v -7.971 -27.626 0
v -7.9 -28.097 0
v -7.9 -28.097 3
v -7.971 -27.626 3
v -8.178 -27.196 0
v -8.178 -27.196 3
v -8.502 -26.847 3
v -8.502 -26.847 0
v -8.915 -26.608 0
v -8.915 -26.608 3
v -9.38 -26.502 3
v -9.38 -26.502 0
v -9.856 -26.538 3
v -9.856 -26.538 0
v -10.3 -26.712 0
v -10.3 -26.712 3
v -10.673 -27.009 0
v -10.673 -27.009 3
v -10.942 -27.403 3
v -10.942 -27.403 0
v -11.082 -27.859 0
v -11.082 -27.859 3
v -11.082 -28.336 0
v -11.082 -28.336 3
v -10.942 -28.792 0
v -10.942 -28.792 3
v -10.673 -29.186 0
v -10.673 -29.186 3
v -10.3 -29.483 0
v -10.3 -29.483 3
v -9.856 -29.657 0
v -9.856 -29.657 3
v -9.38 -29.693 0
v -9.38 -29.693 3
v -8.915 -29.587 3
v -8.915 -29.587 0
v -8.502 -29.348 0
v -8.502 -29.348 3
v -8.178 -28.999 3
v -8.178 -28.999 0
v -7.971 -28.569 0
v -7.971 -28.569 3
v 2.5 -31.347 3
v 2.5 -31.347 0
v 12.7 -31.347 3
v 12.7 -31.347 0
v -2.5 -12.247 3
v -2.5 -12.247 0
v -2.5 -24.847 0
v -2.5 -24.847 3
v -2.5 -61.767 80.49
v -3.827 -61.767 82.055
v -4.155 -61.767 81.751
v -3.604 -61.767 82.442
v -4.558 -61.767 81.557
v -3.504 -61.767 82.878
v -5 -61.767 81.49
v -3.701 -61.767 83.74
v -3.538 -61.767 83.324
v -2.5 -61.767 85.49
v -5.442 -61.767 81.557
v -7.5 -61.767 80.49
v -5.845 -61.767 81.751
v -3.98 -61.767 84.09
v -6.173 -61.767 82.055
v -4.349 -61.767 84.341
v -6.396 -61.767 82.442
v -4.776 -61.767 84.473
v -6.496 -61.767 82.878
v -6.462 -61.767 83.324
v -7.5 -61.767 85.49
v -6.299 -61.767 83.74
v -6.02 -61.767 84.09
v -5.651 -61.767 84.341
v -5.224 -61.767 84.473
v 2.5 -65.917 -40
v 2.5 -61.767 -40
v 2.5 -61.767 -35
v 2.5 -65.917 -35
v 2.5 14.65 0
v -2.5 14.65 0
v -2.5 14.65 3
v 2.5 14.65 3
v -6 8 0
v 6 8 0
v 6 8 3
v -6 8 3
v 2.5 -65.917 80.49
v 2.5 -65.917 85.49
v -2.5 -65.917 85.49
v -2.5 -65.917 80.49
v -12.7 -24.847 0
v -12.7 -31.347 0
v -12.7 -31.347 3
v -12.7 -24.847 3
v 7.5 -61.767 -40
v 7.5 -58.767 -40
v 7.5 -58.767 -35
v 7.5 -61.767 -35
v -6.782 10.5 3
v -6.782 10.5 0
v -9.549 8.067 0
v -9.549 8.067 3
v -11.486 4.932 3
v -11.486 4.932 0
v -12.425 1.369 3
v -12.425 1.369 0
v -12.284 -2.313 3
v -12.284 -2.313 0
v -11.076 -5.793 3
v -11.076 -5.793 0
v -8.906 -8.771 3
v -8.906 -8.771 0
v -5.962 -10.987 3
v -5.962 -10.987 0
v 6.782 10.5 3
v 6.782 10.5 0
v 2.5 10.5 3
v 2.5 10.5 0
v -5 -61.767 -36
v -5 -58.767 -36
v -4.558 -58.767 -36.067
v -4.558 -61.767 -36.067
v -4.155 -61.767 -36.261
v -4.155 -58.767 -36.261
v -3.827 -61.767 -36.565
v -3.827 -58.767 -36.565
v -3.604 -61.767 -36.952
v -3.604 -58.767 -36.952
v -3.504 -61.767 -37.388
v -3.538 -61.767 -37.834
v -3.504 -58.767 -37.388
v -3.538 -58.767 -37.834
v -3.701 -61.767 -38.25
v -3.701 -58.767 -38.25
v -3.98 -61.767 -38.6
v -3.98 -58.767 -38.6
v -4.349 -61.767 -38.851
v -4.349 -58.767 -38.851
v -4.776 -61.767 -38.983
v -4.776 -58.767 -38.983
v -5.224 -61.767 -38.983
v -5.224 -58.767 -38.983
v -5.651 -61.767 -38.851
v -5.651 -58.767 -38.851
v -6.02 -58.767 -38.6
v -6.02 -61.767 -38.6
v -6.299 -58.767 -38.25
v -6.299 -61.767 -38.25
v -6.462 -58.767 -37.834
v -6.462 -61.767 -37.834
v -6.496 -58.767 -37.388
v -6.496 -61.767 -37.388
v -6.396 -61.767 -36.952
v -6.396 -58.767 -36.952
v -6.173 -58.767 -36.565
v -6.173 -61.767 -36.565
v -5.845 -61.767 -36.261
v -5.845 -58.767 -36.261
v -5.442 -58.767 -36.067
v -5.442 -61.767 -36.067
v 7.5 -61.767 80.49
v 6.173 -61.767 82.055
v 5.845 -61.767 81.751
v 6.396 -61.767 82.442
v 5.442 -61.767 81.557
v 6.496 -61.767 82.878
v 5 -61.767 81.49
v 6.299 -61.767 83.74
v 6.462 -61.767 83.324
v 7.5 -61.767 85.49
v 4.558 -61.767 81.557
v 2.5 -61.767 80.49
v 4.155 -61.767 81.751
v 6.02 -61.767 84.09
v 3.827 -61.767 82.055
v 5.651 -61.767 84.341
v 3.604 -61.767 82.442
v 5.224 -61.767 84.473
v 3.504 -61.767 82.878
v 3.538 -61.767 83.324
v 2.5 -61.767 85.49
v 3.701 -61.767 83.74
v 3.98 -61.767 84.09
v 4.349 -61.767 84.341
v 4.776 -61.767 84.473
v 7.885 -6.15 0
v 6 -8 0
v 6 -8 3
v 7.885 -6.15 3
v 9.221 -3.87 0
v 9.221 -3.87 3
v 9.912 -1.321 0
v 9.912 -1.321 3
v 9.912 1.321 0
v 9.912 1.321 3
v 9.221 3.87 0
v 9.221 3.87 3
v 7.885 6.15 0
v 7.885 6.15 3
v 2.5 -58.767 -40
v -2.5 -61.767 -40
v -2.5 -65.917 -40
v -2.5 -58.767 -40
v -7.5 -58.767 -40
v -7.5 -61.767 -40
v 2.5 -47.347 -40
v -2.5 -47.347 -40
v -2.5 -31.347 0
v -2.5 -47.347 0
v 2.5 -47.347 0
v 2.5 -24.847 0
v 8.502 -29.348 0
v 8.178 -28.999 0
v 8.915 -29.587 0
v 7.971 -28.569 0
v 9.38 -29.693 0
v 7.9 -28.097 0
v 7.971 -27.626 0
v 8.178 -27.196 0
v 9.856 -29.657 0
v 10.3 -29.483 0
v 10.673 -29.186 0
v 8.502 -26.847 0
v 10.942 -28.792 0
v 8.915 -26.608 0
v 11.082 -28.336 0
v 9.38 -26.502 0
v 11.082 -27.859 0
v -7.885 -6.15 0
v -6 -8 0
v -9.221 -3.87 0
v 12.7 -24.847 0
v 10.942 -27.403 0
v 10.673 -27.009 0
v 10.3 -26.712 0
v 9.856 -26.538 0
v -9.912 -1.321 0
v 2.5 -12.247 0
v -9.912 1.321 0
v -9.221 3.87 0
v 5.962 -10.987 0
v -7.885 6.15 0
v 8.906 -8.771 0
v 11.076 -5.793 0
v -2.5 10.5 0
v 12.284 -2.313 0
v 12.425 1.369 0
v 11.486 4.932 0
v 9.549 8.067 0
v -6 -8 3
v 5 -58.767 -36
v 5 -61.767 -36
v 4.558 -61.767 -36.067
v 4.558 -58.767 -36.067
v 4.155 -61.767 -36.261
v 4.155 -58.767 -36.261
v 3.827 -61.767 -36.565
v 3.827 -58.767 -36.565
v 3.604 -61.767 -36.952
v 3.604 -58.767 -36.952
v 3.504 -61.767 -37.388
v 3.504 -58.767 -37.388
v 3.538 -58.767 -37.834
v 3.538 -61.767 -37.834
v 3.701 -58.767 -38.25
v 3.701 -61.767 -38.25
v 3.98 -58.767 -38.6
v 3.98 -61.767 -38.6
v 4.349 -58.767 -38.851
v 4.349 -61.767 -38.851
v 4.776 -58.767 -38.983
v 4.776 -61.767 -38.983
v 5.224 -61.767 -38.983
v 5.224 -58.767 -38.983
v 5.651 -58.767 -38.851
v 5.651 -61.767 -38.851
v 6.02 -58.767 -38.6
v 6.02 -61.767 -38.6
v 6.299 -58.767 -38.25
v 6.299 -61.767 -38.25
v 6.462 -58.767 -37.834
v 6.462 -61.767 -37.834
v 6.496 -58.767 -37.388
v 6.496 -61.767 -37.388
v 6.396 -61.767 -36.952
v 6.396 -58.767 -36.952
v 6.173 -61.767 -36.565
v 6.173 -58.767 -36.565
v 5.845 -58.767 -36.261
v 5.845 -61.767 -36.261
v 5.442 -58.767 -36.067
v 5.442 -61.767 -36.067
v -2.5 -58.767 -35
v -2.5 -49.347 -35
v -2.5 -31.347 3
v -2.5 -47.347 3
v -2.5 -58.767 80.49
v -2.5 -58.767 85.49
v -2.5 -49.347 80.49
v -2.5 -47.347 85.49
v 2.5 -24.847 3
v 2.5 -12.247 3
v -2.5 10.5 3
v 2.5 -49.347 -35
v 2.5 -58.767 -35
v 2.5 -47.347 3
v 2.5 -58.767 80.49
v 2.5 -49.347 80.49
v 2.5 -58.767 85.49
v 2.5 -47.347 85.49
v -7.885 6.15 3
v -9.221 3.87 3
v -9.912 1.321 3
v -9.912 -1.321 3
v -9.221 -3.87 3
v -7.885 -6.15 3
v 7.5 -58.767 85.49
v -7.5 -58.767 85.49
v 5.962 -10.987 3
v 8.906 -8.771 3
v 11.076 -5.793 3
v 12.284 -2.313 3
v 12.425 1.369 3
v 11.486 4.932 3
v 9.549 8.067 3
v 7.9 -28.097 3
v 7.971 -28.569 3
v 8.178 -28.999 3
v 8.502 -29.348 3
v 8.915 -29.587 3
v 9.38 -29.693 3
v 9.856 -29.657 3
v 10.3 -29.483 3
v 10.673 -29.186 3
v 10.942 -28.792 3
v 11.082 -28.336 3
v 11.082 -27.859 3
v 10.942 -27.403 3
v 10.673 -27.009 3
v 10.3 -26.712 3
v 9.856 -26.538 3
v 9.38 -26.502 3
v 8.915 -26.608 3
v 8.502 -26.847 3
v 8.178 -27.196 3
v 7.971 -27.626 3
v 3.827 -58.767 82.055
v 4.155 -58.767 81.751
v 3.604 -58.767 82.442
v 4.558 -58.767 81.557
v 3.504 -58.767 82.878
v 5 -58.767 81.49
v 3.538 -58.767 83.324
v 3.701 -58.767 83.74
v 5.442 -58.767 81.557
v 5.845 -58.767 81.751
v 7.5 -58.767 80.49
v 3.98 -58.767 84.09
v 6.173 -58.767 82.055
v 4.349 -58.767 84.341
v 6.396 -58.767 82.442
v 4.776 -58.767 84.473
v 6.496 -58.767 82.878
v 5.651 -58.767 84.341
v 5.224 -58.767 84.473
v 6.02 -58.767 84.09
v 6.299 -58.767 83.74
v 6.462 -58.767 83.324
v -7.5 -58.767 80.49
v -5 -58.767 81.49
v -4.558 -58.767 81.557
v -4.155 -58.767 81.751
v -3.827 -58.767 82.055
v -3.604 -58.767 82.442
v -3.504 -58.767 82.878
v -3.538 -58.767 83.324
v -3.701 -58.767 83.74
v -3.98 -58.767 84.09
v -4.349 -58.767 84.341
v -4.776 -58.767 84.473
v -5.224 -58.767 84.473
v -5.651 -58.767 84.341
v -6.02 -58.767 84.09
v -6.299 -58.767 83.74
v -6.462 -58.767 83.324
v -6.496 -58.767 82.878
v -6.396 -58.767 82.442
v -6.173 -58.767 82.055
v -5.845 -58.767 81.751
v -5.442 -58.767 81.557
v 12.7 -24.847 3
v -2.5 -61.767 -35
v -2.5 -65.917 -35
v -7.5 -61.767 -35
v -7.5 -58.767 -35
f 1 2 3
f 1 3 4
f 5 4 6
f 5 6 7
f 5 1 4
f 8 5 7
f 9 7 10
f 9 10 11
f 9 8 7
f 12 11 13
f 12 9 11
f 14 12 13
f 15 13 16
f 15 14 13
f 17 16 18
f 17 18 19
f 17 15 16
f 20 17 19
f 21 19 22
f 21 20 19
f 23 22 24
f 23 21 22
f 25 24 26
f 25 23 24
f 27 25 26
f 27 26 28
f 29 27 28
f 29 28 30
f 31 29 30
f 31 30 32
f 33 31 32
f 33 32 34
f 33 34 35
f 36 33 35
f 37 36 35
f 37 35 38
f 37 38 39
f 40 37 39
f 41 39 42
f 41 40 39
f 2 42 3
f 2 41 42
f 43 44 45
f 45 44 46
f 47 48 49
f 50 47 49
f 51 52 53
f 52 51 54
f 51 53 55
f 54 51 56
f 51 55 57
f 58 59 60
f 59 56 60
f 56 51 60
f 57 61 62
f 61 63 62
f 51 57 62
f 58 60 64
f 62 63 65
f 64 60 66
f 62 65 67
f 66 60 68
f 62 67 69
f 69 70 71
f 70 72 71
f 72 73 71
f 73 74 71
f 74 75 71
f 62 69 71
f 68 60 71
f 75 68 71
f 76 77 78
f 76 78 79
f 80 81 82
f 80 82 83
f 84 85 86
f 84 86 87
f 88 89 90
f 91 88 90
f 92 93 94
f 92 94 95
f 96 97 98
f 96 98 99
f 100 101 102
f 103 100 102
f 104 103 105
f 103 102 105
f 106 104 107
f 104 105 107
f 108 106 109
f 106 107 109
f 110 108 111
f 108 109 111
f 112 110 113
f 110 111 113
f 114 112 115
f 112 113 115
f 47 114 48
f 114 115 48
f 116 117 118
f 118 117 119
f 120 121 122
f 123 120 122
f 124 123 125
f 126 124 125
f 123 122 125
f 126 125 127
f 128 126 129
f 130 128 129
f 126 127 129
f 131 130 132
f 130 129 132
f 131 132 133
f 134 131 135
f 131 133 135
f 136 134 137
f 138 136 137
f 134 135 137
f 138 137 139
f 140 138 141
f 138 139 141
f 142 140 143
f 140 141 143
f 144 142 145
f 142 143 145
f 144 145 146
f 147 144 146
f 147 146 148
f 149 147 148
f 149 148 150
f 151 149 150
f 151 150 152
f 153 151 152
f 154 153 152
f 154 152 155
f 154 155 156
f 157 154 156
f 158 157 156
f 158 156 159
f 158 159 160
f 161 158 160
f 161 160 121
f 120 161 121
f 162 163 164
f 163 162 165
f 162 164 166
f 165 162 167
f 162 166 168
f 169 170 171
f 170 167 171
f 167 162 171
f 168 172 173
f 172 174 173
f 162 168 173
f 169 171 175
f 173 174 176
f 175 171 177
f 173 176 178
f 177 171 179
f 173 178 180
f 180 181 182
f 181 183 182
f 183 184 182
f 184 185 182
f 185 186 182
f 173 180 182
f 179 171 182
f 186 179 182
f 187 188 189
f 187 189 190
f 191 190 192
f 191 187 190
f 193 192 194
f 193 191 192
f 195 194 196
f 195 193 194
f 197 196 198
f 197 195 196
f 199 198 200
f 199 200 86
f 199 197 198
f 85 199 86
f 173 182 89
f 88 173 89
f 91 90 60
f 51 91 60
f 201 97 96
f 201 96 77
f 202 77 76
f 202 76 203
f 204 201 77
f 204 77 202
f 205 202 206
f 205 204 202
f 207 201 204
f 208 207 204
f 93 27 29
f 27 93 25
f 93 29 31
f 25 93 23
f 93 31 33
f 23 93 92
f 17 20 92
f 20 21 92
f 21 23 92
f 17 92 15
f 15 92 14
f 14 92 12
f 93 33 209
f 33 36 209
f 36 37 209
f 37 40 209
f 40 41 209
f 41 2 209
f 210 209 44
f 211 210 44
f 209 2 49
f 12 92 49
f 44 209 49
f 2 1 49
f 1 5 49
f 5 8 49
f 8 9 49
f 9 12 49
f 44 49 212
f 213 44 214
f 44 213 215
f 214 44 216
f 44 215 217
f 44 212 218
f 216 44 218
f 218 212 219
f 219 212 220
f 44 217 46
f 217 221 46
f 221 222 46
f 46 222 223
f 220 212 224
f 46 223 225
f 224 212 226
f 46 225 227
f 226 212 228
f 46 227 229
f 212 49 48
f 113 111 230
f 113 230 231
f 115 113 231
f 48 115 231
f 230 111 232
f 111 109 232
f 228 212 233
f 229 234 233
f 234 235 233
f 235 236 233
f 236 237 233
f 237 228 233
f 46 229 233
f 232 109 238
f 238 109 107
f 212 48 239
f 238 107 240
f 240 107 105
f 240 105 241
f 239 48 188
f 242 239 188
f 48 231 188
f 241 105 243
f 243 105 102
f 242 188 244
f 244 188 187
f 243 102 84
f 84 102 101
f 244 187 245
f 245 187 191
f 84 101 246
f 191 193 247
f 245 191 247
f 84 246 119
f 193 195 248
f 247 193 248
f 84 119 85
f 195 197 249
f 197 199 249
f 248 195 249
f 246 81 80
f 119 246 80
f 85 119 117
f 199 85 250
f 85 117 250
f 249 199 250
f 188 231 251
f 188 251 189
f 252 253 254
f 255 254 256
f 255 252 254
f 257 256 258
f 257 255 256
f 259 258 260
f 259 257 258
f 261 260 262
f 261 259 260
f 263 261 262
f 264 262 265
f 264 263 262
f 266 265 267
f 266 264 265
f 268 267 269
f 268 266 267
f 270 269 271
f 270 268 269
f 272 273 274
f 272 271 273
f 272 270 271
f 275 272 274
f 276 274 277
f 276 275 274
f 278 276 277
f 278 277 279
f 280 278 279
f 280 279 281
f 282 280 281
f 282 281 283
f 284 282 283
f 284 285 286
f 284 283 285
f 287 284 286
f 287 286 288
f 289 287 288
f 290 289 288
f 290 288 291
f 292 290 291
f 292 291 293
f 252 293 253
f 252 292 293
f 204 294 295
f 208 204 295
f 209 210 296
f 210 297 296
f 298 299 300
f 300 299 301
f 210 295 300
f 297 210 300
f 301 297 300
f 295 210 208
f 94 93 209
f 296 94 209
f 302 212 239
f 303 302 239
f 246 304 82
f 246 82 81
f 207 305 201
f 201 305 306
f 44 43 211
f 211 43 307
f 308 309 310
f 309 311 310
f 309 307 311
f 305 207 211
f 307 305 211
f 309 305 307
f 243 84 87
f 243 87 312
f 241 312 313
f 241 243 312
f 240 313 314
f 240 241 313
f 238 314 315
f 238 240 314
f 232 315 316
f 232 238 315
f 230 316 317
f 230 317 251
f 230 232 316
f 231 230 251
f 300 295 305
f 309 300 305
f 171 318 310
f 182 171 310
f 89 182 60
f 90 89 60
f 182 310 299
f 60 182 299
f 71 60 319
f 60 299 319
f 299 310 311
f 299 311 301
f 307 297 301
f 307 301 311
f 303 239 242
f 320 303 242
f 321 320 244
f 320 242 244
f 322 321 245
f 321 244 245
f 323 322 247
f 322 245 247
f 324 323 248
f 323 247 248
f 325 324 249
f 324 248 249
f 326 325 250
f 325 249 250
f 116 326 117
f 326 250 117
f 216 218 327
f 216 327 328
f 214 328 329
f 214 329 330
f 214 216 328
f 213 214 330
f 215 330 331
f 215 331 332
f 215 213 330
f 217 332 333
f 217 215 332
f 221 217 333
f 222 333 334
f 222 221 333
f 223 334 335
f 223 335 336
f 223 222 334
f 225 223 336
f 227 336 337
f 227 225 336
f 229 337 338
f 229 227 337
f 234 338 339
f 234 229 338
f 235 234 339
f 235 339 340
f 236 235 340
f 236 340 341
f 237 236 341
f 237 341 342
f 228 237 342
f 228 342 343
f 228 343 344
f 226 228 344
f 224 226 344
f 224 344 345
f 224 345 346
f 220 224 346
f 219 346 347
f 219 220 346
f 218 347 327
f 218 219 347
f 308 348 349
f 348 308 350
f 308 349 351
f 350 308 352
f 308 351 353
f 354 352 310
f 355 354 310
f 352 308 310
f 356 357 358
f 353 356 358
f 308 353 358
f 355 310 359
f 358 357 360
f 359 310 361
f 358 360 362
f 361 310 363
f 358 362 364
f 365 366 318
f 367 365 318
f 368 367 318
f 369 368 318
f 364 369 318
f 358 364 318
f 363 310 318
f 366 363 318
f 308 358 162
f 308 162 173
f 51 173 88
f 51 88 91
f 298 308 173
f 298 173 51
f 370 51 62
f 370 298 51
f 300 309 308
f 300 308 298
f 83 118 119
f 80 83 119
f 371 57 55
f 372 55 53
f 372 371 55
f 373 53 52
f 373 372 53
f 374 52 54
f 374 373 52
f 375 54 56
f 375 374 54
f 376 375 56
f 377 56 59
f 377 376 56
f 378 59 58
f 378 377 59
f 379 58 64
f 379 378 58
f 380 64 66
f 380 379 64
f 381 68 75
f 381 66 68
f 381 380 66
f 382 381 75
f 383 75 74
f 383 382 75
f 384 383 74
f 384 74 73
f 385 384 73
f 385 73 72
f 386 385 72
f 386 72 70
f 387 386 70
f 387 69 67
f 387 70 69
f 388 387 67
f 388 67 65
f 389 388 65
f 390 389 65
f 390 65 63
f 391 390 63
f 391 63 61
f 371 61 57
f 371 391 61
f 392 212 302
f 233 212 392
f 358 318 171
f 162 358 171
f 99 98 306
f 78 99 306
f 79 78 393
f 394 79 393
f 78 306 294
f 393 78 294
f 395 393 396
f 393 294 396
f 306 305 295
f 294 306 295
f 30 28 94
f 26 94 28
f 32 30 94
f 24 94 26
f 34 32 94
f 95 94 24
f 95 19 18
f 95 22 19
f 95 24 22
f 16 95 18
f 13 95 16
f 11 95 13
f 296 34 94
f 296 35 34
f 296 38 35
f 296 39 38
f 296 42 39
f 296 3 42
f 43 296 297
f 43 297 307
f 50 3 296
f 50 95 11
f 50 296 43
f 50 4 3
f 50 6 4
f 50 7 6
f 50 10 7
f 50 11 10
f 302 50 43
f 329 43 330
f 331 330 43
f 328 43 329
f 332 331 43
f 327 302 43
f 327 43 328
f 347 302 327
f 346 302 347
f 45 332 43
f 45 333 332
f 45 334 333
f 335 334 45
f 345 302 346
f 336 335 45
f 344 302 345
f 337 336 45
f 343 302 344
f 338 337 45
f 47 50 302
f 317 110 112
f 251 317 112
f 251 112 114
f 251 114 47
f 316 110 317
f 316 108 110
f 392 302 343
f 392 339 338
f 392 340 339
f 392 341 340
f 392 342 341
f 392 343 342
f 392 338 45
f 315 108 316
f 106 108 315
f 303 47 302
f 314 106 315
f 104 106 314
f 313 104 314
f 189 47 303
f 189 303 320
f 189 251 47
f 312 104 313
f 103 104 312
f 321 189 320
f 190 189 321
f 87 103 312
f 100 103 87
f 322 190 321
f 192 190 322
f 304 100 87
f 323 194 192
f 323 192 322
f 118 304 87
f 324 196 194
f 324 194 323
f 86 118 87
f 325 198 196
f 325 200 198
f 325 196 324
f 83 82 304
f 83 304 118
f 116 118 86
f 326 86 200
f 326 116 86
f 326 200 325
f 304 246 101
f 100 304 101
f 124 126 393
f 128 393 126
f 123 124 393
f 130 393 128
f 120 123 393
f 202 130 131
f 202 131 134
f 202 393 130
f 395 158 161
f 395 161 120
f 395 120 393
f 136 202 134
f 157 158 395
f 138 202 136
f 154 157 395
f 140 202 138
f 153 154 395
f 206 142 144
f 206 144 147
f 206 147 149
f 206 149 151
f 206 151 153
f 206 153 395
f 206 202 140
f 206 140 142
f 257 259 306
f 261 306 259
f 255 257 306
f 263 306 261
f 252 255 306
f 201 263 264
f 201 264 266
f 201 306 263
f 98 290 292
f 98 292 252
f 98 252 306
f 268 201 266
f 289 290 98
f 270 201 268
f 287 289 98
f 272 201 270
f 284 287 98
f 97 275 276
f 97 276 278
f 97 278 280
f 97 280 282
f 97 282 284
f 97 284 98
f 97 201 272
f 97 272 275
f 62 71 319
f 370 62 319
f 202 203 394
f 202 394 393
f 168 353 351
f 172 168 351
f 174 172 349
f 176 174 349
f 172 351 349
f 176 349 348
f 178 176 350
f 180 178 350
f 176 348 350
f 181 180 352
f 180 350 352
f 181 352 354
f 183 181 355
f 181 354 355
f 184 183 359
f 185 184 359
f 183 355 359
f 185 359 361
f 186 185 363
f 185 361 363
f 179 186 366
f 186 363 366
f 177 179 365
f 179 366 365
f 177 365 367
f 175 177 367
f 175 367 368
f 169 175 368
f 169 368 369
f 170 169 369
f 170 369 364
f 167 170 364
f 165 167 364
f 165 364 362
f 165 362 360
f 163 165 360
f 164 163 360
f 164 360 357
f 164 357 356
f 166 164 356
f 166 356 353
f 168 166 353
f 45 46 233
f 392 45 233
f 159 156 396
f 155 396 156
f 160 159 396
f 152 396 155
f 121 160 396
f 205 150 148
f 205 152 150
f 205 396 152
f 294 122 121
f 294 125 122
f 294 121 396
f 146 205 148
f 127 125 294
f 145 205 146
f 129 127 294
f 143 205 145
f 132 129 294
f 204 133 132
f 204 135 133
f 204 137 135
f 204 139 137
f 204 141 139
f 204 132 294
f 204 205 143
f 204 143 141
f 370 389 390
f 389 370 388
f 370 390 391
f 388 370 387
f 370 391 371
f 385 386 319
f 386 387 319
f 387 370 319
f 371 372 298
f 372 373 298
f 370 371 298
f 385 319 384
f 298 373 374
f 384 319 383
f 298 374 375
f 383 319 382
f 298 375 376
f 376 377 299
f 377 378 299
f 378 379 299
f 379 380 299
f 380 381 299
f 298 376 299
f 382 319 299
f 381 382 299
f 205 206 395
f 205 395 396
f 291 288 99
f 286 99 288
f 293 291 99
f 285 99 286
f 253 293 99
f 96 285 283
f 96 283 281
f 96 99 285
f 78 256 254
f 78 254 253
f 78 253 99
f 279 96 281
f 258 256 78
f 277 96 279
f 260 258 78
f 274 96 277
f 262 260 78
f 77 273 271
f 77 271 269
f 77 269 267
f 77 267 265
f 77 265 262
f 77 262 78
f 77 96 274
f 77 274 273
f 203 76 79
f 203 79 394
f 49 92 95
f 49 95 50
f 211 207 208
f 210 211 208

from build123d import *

# Parameters (mm, degrees)
BOSS_EXTRUDE1_DEPTH     = 3
SKETCH3_W               = 25.4
SKETCH3_H               = 6.5
SKETCH3_R               = 1.6
BOSS_EXTRUDE4_DEPTH     = 3
SKETCH11_W              = 5
SKETCH11_H              = 3
BOSS_EXTRUDE8_DEPTH     = 4.15
SKETCH6_W               = 5
SKETCH6_H               = 2
BOSS_EXTRUDE5_DEPTH     = 40
SKETCH10_W              = 5
SKETCH10_H              = 2
BOSS_EXTRUDE7_DEPTH     = 82.49
BOSS_EXTRUDE9_DEPTH     = 5
SKETCH15_R              = 1.5
CUT_EXTRUDE1_DEPTH      = 5
MIRROR2_COPY_1_SKETCH_R = 1.5
MIRROR2_COPY_1_DEPTH    = 5


with BuildPart() as part:
    # Sketch1 → Boss-Extrude1 (new body)
    with BuildSketch(Plane.XY):
        with BuildLine():
            Line((2.5, -49.347448714), (2.5, -12.247448714))
            ThreePointArc((2.5, -12.247448714), (12.284218259, -2.312570382), (6.782329983, 10.5))
            Line((6.782329983, 10.5), (-6.782329983, 10.5))
            ThreePointArc((-6.782329983, 10.5), (-12.284218259, -2.312570382), (-2.5, -12.247448714))
            Line((-2.5, -12.247448714), (-2.5, -49.347448714))
            Line((-2.5, -49.347448714), (2.5, -49.347448714))
        make_face()
        with BuildLine():
            Line((-6, -8), (6, -8))
            ThreePointArc((6, -8), (10, 0), (6, 8))
            Line((6, 8), (-6, 8))
            ThreePointArc((-6, 8), (-10, 0), (-6, -8))
        make_face(mode=Mode.SUBTRACT)
    extrude(amount=BOSS_EXTRUDE1_DEPTH)

    # Sketch3 → Boss-Extrude4 (add)
    with BuildSketch(Plane.XY):
        with Locations((0, -28.097448714)):
            Rectangle(SKETCH3_W, SKETCH3_H)
        with Locations((-9.5, -28.097448714)):
            Circle(SKETCH3_R, mode=Mode.SUBTRACT)
        with Locations(Location((9.5, -28.097448714, 0), (0, 0, 180))):
            Circle(SKETCH3_R, mode=Mode.SUBTRACT)
    extrude(amount=BOSS_EXTRUDE4_DEPTH)

    # Sketch11 → Boss-Extrude8 (add)
    with BuildSketch(Plane(origin=(0, 10.5, 0), x_dir=(1, 0, 0), z_dir=(0, 1, 0))):
        with Locations((0, -1.5)):
            Rectangle(SKETCH11_W, SKETCH11_H)
    extrude(amount=BOSS_EXTRUDE8_DEPTH)

    # Sketch6 → Boss-Extrude5 (add)
    with BuildSketch(Plane(origin=(0, 0, 0), x_dir=(-1, 0, 0), z_dir=(0, 0, -1))):
        with Locations((0, -48.347448714)):
            Rectangle(SKETCH6_W, SKETCH6_H)
    extrude(amount=BOSS_EXTRUDE5_DEPTH)

    # Sketch10 → Boss-Extrude7 (add)
    with BuildSketch(Plane.XY.offset(3)):
        with Locations((0, -48.347448714)):
            Rectangle(SKETCH10_W, SKETCH10_H)
    extrude(amount=BOSS_EXTRUDE7_DEPTH)

    # Sketch14 → Boss-Extrude9 (add)
    with BuildSketch(Plane(origin=(0, 0, -40), x_dir=(-1, 0, 0), z_dir=(0, 0, -1))):
        Polygon((-2.5, -61.767448714), (-2.5, -65.917448714), (2.5, -65.917448714), (2.5, -61.767448714), (7.5, -61.767448714), (7.5, -58.767448714), (2.5, -58.767448714), (2.5, -49.347448714), (-2.5, -49.347448714), (-2.5, -58.767448714), (-7.5, -58.767448714), (-7.5, -61.767448714), align=None)
    boss_extrude9 = extrude(amount=-BOSS_EXTRUDE9_DEPTH)

    # Sketch15 → Cut-Extrude1 (cut)
    with BuildSketch(Plane(origin=(0, -58.767448714, 0), x_dir=(1, 0, 0), z_dir=(0, 1, 0))):
        with Locations(Location((-5, 37.5, 0), (0, 0, 270))):
            Circle(SKETCH15_R)
    cut_extrude1 = extrude(amount=-CUT_EXTRUDE1_DEPTH, mode=Mode.SUBTRACT)

    # Mirror1: Cut-Extrude1 across plane
    add(cut_extrude1.mirror(Plane(origin=(0, 0, 0), x_dir=(0, 0, 1), z_dir=(1, 0, 0))), mode=Mode.SUBTRACT)

    # Mirror2: Boss-Extrude9, Cut-Extrude1 across plane
    add(boss_extrude9.mirror(Plane(origin=(0, 0, 22.745), x_dir=(1, 0, 0), z_dir=(0, 0, -1))))
    add(cut_extrude1.mirror(Plane(origin=(0, 0, 22.745), x_dir=(1, 0, 0), z_dir=(0, 0, -1))), mode=Mode.SUBTRACT)

    # Mirror2 copy 1 sketch → Mirror2 copy 1 (cut)
    with BuildSketch(Plane(origin=(0, -58.767448714, 45.49), x_dir=(-1, 0, 0), z_dir=(0, 1, 0))):
        with Locations(Location((-5, 37.5, 0), (0, 0, 270))):
            Circle(MIRROR2_COPY_1_SKETCH_R)
    extrude(amount=-MIRROR2_COPY_1_DEPTH, mode=Mode.SUBTRACT)


solid = part.part
